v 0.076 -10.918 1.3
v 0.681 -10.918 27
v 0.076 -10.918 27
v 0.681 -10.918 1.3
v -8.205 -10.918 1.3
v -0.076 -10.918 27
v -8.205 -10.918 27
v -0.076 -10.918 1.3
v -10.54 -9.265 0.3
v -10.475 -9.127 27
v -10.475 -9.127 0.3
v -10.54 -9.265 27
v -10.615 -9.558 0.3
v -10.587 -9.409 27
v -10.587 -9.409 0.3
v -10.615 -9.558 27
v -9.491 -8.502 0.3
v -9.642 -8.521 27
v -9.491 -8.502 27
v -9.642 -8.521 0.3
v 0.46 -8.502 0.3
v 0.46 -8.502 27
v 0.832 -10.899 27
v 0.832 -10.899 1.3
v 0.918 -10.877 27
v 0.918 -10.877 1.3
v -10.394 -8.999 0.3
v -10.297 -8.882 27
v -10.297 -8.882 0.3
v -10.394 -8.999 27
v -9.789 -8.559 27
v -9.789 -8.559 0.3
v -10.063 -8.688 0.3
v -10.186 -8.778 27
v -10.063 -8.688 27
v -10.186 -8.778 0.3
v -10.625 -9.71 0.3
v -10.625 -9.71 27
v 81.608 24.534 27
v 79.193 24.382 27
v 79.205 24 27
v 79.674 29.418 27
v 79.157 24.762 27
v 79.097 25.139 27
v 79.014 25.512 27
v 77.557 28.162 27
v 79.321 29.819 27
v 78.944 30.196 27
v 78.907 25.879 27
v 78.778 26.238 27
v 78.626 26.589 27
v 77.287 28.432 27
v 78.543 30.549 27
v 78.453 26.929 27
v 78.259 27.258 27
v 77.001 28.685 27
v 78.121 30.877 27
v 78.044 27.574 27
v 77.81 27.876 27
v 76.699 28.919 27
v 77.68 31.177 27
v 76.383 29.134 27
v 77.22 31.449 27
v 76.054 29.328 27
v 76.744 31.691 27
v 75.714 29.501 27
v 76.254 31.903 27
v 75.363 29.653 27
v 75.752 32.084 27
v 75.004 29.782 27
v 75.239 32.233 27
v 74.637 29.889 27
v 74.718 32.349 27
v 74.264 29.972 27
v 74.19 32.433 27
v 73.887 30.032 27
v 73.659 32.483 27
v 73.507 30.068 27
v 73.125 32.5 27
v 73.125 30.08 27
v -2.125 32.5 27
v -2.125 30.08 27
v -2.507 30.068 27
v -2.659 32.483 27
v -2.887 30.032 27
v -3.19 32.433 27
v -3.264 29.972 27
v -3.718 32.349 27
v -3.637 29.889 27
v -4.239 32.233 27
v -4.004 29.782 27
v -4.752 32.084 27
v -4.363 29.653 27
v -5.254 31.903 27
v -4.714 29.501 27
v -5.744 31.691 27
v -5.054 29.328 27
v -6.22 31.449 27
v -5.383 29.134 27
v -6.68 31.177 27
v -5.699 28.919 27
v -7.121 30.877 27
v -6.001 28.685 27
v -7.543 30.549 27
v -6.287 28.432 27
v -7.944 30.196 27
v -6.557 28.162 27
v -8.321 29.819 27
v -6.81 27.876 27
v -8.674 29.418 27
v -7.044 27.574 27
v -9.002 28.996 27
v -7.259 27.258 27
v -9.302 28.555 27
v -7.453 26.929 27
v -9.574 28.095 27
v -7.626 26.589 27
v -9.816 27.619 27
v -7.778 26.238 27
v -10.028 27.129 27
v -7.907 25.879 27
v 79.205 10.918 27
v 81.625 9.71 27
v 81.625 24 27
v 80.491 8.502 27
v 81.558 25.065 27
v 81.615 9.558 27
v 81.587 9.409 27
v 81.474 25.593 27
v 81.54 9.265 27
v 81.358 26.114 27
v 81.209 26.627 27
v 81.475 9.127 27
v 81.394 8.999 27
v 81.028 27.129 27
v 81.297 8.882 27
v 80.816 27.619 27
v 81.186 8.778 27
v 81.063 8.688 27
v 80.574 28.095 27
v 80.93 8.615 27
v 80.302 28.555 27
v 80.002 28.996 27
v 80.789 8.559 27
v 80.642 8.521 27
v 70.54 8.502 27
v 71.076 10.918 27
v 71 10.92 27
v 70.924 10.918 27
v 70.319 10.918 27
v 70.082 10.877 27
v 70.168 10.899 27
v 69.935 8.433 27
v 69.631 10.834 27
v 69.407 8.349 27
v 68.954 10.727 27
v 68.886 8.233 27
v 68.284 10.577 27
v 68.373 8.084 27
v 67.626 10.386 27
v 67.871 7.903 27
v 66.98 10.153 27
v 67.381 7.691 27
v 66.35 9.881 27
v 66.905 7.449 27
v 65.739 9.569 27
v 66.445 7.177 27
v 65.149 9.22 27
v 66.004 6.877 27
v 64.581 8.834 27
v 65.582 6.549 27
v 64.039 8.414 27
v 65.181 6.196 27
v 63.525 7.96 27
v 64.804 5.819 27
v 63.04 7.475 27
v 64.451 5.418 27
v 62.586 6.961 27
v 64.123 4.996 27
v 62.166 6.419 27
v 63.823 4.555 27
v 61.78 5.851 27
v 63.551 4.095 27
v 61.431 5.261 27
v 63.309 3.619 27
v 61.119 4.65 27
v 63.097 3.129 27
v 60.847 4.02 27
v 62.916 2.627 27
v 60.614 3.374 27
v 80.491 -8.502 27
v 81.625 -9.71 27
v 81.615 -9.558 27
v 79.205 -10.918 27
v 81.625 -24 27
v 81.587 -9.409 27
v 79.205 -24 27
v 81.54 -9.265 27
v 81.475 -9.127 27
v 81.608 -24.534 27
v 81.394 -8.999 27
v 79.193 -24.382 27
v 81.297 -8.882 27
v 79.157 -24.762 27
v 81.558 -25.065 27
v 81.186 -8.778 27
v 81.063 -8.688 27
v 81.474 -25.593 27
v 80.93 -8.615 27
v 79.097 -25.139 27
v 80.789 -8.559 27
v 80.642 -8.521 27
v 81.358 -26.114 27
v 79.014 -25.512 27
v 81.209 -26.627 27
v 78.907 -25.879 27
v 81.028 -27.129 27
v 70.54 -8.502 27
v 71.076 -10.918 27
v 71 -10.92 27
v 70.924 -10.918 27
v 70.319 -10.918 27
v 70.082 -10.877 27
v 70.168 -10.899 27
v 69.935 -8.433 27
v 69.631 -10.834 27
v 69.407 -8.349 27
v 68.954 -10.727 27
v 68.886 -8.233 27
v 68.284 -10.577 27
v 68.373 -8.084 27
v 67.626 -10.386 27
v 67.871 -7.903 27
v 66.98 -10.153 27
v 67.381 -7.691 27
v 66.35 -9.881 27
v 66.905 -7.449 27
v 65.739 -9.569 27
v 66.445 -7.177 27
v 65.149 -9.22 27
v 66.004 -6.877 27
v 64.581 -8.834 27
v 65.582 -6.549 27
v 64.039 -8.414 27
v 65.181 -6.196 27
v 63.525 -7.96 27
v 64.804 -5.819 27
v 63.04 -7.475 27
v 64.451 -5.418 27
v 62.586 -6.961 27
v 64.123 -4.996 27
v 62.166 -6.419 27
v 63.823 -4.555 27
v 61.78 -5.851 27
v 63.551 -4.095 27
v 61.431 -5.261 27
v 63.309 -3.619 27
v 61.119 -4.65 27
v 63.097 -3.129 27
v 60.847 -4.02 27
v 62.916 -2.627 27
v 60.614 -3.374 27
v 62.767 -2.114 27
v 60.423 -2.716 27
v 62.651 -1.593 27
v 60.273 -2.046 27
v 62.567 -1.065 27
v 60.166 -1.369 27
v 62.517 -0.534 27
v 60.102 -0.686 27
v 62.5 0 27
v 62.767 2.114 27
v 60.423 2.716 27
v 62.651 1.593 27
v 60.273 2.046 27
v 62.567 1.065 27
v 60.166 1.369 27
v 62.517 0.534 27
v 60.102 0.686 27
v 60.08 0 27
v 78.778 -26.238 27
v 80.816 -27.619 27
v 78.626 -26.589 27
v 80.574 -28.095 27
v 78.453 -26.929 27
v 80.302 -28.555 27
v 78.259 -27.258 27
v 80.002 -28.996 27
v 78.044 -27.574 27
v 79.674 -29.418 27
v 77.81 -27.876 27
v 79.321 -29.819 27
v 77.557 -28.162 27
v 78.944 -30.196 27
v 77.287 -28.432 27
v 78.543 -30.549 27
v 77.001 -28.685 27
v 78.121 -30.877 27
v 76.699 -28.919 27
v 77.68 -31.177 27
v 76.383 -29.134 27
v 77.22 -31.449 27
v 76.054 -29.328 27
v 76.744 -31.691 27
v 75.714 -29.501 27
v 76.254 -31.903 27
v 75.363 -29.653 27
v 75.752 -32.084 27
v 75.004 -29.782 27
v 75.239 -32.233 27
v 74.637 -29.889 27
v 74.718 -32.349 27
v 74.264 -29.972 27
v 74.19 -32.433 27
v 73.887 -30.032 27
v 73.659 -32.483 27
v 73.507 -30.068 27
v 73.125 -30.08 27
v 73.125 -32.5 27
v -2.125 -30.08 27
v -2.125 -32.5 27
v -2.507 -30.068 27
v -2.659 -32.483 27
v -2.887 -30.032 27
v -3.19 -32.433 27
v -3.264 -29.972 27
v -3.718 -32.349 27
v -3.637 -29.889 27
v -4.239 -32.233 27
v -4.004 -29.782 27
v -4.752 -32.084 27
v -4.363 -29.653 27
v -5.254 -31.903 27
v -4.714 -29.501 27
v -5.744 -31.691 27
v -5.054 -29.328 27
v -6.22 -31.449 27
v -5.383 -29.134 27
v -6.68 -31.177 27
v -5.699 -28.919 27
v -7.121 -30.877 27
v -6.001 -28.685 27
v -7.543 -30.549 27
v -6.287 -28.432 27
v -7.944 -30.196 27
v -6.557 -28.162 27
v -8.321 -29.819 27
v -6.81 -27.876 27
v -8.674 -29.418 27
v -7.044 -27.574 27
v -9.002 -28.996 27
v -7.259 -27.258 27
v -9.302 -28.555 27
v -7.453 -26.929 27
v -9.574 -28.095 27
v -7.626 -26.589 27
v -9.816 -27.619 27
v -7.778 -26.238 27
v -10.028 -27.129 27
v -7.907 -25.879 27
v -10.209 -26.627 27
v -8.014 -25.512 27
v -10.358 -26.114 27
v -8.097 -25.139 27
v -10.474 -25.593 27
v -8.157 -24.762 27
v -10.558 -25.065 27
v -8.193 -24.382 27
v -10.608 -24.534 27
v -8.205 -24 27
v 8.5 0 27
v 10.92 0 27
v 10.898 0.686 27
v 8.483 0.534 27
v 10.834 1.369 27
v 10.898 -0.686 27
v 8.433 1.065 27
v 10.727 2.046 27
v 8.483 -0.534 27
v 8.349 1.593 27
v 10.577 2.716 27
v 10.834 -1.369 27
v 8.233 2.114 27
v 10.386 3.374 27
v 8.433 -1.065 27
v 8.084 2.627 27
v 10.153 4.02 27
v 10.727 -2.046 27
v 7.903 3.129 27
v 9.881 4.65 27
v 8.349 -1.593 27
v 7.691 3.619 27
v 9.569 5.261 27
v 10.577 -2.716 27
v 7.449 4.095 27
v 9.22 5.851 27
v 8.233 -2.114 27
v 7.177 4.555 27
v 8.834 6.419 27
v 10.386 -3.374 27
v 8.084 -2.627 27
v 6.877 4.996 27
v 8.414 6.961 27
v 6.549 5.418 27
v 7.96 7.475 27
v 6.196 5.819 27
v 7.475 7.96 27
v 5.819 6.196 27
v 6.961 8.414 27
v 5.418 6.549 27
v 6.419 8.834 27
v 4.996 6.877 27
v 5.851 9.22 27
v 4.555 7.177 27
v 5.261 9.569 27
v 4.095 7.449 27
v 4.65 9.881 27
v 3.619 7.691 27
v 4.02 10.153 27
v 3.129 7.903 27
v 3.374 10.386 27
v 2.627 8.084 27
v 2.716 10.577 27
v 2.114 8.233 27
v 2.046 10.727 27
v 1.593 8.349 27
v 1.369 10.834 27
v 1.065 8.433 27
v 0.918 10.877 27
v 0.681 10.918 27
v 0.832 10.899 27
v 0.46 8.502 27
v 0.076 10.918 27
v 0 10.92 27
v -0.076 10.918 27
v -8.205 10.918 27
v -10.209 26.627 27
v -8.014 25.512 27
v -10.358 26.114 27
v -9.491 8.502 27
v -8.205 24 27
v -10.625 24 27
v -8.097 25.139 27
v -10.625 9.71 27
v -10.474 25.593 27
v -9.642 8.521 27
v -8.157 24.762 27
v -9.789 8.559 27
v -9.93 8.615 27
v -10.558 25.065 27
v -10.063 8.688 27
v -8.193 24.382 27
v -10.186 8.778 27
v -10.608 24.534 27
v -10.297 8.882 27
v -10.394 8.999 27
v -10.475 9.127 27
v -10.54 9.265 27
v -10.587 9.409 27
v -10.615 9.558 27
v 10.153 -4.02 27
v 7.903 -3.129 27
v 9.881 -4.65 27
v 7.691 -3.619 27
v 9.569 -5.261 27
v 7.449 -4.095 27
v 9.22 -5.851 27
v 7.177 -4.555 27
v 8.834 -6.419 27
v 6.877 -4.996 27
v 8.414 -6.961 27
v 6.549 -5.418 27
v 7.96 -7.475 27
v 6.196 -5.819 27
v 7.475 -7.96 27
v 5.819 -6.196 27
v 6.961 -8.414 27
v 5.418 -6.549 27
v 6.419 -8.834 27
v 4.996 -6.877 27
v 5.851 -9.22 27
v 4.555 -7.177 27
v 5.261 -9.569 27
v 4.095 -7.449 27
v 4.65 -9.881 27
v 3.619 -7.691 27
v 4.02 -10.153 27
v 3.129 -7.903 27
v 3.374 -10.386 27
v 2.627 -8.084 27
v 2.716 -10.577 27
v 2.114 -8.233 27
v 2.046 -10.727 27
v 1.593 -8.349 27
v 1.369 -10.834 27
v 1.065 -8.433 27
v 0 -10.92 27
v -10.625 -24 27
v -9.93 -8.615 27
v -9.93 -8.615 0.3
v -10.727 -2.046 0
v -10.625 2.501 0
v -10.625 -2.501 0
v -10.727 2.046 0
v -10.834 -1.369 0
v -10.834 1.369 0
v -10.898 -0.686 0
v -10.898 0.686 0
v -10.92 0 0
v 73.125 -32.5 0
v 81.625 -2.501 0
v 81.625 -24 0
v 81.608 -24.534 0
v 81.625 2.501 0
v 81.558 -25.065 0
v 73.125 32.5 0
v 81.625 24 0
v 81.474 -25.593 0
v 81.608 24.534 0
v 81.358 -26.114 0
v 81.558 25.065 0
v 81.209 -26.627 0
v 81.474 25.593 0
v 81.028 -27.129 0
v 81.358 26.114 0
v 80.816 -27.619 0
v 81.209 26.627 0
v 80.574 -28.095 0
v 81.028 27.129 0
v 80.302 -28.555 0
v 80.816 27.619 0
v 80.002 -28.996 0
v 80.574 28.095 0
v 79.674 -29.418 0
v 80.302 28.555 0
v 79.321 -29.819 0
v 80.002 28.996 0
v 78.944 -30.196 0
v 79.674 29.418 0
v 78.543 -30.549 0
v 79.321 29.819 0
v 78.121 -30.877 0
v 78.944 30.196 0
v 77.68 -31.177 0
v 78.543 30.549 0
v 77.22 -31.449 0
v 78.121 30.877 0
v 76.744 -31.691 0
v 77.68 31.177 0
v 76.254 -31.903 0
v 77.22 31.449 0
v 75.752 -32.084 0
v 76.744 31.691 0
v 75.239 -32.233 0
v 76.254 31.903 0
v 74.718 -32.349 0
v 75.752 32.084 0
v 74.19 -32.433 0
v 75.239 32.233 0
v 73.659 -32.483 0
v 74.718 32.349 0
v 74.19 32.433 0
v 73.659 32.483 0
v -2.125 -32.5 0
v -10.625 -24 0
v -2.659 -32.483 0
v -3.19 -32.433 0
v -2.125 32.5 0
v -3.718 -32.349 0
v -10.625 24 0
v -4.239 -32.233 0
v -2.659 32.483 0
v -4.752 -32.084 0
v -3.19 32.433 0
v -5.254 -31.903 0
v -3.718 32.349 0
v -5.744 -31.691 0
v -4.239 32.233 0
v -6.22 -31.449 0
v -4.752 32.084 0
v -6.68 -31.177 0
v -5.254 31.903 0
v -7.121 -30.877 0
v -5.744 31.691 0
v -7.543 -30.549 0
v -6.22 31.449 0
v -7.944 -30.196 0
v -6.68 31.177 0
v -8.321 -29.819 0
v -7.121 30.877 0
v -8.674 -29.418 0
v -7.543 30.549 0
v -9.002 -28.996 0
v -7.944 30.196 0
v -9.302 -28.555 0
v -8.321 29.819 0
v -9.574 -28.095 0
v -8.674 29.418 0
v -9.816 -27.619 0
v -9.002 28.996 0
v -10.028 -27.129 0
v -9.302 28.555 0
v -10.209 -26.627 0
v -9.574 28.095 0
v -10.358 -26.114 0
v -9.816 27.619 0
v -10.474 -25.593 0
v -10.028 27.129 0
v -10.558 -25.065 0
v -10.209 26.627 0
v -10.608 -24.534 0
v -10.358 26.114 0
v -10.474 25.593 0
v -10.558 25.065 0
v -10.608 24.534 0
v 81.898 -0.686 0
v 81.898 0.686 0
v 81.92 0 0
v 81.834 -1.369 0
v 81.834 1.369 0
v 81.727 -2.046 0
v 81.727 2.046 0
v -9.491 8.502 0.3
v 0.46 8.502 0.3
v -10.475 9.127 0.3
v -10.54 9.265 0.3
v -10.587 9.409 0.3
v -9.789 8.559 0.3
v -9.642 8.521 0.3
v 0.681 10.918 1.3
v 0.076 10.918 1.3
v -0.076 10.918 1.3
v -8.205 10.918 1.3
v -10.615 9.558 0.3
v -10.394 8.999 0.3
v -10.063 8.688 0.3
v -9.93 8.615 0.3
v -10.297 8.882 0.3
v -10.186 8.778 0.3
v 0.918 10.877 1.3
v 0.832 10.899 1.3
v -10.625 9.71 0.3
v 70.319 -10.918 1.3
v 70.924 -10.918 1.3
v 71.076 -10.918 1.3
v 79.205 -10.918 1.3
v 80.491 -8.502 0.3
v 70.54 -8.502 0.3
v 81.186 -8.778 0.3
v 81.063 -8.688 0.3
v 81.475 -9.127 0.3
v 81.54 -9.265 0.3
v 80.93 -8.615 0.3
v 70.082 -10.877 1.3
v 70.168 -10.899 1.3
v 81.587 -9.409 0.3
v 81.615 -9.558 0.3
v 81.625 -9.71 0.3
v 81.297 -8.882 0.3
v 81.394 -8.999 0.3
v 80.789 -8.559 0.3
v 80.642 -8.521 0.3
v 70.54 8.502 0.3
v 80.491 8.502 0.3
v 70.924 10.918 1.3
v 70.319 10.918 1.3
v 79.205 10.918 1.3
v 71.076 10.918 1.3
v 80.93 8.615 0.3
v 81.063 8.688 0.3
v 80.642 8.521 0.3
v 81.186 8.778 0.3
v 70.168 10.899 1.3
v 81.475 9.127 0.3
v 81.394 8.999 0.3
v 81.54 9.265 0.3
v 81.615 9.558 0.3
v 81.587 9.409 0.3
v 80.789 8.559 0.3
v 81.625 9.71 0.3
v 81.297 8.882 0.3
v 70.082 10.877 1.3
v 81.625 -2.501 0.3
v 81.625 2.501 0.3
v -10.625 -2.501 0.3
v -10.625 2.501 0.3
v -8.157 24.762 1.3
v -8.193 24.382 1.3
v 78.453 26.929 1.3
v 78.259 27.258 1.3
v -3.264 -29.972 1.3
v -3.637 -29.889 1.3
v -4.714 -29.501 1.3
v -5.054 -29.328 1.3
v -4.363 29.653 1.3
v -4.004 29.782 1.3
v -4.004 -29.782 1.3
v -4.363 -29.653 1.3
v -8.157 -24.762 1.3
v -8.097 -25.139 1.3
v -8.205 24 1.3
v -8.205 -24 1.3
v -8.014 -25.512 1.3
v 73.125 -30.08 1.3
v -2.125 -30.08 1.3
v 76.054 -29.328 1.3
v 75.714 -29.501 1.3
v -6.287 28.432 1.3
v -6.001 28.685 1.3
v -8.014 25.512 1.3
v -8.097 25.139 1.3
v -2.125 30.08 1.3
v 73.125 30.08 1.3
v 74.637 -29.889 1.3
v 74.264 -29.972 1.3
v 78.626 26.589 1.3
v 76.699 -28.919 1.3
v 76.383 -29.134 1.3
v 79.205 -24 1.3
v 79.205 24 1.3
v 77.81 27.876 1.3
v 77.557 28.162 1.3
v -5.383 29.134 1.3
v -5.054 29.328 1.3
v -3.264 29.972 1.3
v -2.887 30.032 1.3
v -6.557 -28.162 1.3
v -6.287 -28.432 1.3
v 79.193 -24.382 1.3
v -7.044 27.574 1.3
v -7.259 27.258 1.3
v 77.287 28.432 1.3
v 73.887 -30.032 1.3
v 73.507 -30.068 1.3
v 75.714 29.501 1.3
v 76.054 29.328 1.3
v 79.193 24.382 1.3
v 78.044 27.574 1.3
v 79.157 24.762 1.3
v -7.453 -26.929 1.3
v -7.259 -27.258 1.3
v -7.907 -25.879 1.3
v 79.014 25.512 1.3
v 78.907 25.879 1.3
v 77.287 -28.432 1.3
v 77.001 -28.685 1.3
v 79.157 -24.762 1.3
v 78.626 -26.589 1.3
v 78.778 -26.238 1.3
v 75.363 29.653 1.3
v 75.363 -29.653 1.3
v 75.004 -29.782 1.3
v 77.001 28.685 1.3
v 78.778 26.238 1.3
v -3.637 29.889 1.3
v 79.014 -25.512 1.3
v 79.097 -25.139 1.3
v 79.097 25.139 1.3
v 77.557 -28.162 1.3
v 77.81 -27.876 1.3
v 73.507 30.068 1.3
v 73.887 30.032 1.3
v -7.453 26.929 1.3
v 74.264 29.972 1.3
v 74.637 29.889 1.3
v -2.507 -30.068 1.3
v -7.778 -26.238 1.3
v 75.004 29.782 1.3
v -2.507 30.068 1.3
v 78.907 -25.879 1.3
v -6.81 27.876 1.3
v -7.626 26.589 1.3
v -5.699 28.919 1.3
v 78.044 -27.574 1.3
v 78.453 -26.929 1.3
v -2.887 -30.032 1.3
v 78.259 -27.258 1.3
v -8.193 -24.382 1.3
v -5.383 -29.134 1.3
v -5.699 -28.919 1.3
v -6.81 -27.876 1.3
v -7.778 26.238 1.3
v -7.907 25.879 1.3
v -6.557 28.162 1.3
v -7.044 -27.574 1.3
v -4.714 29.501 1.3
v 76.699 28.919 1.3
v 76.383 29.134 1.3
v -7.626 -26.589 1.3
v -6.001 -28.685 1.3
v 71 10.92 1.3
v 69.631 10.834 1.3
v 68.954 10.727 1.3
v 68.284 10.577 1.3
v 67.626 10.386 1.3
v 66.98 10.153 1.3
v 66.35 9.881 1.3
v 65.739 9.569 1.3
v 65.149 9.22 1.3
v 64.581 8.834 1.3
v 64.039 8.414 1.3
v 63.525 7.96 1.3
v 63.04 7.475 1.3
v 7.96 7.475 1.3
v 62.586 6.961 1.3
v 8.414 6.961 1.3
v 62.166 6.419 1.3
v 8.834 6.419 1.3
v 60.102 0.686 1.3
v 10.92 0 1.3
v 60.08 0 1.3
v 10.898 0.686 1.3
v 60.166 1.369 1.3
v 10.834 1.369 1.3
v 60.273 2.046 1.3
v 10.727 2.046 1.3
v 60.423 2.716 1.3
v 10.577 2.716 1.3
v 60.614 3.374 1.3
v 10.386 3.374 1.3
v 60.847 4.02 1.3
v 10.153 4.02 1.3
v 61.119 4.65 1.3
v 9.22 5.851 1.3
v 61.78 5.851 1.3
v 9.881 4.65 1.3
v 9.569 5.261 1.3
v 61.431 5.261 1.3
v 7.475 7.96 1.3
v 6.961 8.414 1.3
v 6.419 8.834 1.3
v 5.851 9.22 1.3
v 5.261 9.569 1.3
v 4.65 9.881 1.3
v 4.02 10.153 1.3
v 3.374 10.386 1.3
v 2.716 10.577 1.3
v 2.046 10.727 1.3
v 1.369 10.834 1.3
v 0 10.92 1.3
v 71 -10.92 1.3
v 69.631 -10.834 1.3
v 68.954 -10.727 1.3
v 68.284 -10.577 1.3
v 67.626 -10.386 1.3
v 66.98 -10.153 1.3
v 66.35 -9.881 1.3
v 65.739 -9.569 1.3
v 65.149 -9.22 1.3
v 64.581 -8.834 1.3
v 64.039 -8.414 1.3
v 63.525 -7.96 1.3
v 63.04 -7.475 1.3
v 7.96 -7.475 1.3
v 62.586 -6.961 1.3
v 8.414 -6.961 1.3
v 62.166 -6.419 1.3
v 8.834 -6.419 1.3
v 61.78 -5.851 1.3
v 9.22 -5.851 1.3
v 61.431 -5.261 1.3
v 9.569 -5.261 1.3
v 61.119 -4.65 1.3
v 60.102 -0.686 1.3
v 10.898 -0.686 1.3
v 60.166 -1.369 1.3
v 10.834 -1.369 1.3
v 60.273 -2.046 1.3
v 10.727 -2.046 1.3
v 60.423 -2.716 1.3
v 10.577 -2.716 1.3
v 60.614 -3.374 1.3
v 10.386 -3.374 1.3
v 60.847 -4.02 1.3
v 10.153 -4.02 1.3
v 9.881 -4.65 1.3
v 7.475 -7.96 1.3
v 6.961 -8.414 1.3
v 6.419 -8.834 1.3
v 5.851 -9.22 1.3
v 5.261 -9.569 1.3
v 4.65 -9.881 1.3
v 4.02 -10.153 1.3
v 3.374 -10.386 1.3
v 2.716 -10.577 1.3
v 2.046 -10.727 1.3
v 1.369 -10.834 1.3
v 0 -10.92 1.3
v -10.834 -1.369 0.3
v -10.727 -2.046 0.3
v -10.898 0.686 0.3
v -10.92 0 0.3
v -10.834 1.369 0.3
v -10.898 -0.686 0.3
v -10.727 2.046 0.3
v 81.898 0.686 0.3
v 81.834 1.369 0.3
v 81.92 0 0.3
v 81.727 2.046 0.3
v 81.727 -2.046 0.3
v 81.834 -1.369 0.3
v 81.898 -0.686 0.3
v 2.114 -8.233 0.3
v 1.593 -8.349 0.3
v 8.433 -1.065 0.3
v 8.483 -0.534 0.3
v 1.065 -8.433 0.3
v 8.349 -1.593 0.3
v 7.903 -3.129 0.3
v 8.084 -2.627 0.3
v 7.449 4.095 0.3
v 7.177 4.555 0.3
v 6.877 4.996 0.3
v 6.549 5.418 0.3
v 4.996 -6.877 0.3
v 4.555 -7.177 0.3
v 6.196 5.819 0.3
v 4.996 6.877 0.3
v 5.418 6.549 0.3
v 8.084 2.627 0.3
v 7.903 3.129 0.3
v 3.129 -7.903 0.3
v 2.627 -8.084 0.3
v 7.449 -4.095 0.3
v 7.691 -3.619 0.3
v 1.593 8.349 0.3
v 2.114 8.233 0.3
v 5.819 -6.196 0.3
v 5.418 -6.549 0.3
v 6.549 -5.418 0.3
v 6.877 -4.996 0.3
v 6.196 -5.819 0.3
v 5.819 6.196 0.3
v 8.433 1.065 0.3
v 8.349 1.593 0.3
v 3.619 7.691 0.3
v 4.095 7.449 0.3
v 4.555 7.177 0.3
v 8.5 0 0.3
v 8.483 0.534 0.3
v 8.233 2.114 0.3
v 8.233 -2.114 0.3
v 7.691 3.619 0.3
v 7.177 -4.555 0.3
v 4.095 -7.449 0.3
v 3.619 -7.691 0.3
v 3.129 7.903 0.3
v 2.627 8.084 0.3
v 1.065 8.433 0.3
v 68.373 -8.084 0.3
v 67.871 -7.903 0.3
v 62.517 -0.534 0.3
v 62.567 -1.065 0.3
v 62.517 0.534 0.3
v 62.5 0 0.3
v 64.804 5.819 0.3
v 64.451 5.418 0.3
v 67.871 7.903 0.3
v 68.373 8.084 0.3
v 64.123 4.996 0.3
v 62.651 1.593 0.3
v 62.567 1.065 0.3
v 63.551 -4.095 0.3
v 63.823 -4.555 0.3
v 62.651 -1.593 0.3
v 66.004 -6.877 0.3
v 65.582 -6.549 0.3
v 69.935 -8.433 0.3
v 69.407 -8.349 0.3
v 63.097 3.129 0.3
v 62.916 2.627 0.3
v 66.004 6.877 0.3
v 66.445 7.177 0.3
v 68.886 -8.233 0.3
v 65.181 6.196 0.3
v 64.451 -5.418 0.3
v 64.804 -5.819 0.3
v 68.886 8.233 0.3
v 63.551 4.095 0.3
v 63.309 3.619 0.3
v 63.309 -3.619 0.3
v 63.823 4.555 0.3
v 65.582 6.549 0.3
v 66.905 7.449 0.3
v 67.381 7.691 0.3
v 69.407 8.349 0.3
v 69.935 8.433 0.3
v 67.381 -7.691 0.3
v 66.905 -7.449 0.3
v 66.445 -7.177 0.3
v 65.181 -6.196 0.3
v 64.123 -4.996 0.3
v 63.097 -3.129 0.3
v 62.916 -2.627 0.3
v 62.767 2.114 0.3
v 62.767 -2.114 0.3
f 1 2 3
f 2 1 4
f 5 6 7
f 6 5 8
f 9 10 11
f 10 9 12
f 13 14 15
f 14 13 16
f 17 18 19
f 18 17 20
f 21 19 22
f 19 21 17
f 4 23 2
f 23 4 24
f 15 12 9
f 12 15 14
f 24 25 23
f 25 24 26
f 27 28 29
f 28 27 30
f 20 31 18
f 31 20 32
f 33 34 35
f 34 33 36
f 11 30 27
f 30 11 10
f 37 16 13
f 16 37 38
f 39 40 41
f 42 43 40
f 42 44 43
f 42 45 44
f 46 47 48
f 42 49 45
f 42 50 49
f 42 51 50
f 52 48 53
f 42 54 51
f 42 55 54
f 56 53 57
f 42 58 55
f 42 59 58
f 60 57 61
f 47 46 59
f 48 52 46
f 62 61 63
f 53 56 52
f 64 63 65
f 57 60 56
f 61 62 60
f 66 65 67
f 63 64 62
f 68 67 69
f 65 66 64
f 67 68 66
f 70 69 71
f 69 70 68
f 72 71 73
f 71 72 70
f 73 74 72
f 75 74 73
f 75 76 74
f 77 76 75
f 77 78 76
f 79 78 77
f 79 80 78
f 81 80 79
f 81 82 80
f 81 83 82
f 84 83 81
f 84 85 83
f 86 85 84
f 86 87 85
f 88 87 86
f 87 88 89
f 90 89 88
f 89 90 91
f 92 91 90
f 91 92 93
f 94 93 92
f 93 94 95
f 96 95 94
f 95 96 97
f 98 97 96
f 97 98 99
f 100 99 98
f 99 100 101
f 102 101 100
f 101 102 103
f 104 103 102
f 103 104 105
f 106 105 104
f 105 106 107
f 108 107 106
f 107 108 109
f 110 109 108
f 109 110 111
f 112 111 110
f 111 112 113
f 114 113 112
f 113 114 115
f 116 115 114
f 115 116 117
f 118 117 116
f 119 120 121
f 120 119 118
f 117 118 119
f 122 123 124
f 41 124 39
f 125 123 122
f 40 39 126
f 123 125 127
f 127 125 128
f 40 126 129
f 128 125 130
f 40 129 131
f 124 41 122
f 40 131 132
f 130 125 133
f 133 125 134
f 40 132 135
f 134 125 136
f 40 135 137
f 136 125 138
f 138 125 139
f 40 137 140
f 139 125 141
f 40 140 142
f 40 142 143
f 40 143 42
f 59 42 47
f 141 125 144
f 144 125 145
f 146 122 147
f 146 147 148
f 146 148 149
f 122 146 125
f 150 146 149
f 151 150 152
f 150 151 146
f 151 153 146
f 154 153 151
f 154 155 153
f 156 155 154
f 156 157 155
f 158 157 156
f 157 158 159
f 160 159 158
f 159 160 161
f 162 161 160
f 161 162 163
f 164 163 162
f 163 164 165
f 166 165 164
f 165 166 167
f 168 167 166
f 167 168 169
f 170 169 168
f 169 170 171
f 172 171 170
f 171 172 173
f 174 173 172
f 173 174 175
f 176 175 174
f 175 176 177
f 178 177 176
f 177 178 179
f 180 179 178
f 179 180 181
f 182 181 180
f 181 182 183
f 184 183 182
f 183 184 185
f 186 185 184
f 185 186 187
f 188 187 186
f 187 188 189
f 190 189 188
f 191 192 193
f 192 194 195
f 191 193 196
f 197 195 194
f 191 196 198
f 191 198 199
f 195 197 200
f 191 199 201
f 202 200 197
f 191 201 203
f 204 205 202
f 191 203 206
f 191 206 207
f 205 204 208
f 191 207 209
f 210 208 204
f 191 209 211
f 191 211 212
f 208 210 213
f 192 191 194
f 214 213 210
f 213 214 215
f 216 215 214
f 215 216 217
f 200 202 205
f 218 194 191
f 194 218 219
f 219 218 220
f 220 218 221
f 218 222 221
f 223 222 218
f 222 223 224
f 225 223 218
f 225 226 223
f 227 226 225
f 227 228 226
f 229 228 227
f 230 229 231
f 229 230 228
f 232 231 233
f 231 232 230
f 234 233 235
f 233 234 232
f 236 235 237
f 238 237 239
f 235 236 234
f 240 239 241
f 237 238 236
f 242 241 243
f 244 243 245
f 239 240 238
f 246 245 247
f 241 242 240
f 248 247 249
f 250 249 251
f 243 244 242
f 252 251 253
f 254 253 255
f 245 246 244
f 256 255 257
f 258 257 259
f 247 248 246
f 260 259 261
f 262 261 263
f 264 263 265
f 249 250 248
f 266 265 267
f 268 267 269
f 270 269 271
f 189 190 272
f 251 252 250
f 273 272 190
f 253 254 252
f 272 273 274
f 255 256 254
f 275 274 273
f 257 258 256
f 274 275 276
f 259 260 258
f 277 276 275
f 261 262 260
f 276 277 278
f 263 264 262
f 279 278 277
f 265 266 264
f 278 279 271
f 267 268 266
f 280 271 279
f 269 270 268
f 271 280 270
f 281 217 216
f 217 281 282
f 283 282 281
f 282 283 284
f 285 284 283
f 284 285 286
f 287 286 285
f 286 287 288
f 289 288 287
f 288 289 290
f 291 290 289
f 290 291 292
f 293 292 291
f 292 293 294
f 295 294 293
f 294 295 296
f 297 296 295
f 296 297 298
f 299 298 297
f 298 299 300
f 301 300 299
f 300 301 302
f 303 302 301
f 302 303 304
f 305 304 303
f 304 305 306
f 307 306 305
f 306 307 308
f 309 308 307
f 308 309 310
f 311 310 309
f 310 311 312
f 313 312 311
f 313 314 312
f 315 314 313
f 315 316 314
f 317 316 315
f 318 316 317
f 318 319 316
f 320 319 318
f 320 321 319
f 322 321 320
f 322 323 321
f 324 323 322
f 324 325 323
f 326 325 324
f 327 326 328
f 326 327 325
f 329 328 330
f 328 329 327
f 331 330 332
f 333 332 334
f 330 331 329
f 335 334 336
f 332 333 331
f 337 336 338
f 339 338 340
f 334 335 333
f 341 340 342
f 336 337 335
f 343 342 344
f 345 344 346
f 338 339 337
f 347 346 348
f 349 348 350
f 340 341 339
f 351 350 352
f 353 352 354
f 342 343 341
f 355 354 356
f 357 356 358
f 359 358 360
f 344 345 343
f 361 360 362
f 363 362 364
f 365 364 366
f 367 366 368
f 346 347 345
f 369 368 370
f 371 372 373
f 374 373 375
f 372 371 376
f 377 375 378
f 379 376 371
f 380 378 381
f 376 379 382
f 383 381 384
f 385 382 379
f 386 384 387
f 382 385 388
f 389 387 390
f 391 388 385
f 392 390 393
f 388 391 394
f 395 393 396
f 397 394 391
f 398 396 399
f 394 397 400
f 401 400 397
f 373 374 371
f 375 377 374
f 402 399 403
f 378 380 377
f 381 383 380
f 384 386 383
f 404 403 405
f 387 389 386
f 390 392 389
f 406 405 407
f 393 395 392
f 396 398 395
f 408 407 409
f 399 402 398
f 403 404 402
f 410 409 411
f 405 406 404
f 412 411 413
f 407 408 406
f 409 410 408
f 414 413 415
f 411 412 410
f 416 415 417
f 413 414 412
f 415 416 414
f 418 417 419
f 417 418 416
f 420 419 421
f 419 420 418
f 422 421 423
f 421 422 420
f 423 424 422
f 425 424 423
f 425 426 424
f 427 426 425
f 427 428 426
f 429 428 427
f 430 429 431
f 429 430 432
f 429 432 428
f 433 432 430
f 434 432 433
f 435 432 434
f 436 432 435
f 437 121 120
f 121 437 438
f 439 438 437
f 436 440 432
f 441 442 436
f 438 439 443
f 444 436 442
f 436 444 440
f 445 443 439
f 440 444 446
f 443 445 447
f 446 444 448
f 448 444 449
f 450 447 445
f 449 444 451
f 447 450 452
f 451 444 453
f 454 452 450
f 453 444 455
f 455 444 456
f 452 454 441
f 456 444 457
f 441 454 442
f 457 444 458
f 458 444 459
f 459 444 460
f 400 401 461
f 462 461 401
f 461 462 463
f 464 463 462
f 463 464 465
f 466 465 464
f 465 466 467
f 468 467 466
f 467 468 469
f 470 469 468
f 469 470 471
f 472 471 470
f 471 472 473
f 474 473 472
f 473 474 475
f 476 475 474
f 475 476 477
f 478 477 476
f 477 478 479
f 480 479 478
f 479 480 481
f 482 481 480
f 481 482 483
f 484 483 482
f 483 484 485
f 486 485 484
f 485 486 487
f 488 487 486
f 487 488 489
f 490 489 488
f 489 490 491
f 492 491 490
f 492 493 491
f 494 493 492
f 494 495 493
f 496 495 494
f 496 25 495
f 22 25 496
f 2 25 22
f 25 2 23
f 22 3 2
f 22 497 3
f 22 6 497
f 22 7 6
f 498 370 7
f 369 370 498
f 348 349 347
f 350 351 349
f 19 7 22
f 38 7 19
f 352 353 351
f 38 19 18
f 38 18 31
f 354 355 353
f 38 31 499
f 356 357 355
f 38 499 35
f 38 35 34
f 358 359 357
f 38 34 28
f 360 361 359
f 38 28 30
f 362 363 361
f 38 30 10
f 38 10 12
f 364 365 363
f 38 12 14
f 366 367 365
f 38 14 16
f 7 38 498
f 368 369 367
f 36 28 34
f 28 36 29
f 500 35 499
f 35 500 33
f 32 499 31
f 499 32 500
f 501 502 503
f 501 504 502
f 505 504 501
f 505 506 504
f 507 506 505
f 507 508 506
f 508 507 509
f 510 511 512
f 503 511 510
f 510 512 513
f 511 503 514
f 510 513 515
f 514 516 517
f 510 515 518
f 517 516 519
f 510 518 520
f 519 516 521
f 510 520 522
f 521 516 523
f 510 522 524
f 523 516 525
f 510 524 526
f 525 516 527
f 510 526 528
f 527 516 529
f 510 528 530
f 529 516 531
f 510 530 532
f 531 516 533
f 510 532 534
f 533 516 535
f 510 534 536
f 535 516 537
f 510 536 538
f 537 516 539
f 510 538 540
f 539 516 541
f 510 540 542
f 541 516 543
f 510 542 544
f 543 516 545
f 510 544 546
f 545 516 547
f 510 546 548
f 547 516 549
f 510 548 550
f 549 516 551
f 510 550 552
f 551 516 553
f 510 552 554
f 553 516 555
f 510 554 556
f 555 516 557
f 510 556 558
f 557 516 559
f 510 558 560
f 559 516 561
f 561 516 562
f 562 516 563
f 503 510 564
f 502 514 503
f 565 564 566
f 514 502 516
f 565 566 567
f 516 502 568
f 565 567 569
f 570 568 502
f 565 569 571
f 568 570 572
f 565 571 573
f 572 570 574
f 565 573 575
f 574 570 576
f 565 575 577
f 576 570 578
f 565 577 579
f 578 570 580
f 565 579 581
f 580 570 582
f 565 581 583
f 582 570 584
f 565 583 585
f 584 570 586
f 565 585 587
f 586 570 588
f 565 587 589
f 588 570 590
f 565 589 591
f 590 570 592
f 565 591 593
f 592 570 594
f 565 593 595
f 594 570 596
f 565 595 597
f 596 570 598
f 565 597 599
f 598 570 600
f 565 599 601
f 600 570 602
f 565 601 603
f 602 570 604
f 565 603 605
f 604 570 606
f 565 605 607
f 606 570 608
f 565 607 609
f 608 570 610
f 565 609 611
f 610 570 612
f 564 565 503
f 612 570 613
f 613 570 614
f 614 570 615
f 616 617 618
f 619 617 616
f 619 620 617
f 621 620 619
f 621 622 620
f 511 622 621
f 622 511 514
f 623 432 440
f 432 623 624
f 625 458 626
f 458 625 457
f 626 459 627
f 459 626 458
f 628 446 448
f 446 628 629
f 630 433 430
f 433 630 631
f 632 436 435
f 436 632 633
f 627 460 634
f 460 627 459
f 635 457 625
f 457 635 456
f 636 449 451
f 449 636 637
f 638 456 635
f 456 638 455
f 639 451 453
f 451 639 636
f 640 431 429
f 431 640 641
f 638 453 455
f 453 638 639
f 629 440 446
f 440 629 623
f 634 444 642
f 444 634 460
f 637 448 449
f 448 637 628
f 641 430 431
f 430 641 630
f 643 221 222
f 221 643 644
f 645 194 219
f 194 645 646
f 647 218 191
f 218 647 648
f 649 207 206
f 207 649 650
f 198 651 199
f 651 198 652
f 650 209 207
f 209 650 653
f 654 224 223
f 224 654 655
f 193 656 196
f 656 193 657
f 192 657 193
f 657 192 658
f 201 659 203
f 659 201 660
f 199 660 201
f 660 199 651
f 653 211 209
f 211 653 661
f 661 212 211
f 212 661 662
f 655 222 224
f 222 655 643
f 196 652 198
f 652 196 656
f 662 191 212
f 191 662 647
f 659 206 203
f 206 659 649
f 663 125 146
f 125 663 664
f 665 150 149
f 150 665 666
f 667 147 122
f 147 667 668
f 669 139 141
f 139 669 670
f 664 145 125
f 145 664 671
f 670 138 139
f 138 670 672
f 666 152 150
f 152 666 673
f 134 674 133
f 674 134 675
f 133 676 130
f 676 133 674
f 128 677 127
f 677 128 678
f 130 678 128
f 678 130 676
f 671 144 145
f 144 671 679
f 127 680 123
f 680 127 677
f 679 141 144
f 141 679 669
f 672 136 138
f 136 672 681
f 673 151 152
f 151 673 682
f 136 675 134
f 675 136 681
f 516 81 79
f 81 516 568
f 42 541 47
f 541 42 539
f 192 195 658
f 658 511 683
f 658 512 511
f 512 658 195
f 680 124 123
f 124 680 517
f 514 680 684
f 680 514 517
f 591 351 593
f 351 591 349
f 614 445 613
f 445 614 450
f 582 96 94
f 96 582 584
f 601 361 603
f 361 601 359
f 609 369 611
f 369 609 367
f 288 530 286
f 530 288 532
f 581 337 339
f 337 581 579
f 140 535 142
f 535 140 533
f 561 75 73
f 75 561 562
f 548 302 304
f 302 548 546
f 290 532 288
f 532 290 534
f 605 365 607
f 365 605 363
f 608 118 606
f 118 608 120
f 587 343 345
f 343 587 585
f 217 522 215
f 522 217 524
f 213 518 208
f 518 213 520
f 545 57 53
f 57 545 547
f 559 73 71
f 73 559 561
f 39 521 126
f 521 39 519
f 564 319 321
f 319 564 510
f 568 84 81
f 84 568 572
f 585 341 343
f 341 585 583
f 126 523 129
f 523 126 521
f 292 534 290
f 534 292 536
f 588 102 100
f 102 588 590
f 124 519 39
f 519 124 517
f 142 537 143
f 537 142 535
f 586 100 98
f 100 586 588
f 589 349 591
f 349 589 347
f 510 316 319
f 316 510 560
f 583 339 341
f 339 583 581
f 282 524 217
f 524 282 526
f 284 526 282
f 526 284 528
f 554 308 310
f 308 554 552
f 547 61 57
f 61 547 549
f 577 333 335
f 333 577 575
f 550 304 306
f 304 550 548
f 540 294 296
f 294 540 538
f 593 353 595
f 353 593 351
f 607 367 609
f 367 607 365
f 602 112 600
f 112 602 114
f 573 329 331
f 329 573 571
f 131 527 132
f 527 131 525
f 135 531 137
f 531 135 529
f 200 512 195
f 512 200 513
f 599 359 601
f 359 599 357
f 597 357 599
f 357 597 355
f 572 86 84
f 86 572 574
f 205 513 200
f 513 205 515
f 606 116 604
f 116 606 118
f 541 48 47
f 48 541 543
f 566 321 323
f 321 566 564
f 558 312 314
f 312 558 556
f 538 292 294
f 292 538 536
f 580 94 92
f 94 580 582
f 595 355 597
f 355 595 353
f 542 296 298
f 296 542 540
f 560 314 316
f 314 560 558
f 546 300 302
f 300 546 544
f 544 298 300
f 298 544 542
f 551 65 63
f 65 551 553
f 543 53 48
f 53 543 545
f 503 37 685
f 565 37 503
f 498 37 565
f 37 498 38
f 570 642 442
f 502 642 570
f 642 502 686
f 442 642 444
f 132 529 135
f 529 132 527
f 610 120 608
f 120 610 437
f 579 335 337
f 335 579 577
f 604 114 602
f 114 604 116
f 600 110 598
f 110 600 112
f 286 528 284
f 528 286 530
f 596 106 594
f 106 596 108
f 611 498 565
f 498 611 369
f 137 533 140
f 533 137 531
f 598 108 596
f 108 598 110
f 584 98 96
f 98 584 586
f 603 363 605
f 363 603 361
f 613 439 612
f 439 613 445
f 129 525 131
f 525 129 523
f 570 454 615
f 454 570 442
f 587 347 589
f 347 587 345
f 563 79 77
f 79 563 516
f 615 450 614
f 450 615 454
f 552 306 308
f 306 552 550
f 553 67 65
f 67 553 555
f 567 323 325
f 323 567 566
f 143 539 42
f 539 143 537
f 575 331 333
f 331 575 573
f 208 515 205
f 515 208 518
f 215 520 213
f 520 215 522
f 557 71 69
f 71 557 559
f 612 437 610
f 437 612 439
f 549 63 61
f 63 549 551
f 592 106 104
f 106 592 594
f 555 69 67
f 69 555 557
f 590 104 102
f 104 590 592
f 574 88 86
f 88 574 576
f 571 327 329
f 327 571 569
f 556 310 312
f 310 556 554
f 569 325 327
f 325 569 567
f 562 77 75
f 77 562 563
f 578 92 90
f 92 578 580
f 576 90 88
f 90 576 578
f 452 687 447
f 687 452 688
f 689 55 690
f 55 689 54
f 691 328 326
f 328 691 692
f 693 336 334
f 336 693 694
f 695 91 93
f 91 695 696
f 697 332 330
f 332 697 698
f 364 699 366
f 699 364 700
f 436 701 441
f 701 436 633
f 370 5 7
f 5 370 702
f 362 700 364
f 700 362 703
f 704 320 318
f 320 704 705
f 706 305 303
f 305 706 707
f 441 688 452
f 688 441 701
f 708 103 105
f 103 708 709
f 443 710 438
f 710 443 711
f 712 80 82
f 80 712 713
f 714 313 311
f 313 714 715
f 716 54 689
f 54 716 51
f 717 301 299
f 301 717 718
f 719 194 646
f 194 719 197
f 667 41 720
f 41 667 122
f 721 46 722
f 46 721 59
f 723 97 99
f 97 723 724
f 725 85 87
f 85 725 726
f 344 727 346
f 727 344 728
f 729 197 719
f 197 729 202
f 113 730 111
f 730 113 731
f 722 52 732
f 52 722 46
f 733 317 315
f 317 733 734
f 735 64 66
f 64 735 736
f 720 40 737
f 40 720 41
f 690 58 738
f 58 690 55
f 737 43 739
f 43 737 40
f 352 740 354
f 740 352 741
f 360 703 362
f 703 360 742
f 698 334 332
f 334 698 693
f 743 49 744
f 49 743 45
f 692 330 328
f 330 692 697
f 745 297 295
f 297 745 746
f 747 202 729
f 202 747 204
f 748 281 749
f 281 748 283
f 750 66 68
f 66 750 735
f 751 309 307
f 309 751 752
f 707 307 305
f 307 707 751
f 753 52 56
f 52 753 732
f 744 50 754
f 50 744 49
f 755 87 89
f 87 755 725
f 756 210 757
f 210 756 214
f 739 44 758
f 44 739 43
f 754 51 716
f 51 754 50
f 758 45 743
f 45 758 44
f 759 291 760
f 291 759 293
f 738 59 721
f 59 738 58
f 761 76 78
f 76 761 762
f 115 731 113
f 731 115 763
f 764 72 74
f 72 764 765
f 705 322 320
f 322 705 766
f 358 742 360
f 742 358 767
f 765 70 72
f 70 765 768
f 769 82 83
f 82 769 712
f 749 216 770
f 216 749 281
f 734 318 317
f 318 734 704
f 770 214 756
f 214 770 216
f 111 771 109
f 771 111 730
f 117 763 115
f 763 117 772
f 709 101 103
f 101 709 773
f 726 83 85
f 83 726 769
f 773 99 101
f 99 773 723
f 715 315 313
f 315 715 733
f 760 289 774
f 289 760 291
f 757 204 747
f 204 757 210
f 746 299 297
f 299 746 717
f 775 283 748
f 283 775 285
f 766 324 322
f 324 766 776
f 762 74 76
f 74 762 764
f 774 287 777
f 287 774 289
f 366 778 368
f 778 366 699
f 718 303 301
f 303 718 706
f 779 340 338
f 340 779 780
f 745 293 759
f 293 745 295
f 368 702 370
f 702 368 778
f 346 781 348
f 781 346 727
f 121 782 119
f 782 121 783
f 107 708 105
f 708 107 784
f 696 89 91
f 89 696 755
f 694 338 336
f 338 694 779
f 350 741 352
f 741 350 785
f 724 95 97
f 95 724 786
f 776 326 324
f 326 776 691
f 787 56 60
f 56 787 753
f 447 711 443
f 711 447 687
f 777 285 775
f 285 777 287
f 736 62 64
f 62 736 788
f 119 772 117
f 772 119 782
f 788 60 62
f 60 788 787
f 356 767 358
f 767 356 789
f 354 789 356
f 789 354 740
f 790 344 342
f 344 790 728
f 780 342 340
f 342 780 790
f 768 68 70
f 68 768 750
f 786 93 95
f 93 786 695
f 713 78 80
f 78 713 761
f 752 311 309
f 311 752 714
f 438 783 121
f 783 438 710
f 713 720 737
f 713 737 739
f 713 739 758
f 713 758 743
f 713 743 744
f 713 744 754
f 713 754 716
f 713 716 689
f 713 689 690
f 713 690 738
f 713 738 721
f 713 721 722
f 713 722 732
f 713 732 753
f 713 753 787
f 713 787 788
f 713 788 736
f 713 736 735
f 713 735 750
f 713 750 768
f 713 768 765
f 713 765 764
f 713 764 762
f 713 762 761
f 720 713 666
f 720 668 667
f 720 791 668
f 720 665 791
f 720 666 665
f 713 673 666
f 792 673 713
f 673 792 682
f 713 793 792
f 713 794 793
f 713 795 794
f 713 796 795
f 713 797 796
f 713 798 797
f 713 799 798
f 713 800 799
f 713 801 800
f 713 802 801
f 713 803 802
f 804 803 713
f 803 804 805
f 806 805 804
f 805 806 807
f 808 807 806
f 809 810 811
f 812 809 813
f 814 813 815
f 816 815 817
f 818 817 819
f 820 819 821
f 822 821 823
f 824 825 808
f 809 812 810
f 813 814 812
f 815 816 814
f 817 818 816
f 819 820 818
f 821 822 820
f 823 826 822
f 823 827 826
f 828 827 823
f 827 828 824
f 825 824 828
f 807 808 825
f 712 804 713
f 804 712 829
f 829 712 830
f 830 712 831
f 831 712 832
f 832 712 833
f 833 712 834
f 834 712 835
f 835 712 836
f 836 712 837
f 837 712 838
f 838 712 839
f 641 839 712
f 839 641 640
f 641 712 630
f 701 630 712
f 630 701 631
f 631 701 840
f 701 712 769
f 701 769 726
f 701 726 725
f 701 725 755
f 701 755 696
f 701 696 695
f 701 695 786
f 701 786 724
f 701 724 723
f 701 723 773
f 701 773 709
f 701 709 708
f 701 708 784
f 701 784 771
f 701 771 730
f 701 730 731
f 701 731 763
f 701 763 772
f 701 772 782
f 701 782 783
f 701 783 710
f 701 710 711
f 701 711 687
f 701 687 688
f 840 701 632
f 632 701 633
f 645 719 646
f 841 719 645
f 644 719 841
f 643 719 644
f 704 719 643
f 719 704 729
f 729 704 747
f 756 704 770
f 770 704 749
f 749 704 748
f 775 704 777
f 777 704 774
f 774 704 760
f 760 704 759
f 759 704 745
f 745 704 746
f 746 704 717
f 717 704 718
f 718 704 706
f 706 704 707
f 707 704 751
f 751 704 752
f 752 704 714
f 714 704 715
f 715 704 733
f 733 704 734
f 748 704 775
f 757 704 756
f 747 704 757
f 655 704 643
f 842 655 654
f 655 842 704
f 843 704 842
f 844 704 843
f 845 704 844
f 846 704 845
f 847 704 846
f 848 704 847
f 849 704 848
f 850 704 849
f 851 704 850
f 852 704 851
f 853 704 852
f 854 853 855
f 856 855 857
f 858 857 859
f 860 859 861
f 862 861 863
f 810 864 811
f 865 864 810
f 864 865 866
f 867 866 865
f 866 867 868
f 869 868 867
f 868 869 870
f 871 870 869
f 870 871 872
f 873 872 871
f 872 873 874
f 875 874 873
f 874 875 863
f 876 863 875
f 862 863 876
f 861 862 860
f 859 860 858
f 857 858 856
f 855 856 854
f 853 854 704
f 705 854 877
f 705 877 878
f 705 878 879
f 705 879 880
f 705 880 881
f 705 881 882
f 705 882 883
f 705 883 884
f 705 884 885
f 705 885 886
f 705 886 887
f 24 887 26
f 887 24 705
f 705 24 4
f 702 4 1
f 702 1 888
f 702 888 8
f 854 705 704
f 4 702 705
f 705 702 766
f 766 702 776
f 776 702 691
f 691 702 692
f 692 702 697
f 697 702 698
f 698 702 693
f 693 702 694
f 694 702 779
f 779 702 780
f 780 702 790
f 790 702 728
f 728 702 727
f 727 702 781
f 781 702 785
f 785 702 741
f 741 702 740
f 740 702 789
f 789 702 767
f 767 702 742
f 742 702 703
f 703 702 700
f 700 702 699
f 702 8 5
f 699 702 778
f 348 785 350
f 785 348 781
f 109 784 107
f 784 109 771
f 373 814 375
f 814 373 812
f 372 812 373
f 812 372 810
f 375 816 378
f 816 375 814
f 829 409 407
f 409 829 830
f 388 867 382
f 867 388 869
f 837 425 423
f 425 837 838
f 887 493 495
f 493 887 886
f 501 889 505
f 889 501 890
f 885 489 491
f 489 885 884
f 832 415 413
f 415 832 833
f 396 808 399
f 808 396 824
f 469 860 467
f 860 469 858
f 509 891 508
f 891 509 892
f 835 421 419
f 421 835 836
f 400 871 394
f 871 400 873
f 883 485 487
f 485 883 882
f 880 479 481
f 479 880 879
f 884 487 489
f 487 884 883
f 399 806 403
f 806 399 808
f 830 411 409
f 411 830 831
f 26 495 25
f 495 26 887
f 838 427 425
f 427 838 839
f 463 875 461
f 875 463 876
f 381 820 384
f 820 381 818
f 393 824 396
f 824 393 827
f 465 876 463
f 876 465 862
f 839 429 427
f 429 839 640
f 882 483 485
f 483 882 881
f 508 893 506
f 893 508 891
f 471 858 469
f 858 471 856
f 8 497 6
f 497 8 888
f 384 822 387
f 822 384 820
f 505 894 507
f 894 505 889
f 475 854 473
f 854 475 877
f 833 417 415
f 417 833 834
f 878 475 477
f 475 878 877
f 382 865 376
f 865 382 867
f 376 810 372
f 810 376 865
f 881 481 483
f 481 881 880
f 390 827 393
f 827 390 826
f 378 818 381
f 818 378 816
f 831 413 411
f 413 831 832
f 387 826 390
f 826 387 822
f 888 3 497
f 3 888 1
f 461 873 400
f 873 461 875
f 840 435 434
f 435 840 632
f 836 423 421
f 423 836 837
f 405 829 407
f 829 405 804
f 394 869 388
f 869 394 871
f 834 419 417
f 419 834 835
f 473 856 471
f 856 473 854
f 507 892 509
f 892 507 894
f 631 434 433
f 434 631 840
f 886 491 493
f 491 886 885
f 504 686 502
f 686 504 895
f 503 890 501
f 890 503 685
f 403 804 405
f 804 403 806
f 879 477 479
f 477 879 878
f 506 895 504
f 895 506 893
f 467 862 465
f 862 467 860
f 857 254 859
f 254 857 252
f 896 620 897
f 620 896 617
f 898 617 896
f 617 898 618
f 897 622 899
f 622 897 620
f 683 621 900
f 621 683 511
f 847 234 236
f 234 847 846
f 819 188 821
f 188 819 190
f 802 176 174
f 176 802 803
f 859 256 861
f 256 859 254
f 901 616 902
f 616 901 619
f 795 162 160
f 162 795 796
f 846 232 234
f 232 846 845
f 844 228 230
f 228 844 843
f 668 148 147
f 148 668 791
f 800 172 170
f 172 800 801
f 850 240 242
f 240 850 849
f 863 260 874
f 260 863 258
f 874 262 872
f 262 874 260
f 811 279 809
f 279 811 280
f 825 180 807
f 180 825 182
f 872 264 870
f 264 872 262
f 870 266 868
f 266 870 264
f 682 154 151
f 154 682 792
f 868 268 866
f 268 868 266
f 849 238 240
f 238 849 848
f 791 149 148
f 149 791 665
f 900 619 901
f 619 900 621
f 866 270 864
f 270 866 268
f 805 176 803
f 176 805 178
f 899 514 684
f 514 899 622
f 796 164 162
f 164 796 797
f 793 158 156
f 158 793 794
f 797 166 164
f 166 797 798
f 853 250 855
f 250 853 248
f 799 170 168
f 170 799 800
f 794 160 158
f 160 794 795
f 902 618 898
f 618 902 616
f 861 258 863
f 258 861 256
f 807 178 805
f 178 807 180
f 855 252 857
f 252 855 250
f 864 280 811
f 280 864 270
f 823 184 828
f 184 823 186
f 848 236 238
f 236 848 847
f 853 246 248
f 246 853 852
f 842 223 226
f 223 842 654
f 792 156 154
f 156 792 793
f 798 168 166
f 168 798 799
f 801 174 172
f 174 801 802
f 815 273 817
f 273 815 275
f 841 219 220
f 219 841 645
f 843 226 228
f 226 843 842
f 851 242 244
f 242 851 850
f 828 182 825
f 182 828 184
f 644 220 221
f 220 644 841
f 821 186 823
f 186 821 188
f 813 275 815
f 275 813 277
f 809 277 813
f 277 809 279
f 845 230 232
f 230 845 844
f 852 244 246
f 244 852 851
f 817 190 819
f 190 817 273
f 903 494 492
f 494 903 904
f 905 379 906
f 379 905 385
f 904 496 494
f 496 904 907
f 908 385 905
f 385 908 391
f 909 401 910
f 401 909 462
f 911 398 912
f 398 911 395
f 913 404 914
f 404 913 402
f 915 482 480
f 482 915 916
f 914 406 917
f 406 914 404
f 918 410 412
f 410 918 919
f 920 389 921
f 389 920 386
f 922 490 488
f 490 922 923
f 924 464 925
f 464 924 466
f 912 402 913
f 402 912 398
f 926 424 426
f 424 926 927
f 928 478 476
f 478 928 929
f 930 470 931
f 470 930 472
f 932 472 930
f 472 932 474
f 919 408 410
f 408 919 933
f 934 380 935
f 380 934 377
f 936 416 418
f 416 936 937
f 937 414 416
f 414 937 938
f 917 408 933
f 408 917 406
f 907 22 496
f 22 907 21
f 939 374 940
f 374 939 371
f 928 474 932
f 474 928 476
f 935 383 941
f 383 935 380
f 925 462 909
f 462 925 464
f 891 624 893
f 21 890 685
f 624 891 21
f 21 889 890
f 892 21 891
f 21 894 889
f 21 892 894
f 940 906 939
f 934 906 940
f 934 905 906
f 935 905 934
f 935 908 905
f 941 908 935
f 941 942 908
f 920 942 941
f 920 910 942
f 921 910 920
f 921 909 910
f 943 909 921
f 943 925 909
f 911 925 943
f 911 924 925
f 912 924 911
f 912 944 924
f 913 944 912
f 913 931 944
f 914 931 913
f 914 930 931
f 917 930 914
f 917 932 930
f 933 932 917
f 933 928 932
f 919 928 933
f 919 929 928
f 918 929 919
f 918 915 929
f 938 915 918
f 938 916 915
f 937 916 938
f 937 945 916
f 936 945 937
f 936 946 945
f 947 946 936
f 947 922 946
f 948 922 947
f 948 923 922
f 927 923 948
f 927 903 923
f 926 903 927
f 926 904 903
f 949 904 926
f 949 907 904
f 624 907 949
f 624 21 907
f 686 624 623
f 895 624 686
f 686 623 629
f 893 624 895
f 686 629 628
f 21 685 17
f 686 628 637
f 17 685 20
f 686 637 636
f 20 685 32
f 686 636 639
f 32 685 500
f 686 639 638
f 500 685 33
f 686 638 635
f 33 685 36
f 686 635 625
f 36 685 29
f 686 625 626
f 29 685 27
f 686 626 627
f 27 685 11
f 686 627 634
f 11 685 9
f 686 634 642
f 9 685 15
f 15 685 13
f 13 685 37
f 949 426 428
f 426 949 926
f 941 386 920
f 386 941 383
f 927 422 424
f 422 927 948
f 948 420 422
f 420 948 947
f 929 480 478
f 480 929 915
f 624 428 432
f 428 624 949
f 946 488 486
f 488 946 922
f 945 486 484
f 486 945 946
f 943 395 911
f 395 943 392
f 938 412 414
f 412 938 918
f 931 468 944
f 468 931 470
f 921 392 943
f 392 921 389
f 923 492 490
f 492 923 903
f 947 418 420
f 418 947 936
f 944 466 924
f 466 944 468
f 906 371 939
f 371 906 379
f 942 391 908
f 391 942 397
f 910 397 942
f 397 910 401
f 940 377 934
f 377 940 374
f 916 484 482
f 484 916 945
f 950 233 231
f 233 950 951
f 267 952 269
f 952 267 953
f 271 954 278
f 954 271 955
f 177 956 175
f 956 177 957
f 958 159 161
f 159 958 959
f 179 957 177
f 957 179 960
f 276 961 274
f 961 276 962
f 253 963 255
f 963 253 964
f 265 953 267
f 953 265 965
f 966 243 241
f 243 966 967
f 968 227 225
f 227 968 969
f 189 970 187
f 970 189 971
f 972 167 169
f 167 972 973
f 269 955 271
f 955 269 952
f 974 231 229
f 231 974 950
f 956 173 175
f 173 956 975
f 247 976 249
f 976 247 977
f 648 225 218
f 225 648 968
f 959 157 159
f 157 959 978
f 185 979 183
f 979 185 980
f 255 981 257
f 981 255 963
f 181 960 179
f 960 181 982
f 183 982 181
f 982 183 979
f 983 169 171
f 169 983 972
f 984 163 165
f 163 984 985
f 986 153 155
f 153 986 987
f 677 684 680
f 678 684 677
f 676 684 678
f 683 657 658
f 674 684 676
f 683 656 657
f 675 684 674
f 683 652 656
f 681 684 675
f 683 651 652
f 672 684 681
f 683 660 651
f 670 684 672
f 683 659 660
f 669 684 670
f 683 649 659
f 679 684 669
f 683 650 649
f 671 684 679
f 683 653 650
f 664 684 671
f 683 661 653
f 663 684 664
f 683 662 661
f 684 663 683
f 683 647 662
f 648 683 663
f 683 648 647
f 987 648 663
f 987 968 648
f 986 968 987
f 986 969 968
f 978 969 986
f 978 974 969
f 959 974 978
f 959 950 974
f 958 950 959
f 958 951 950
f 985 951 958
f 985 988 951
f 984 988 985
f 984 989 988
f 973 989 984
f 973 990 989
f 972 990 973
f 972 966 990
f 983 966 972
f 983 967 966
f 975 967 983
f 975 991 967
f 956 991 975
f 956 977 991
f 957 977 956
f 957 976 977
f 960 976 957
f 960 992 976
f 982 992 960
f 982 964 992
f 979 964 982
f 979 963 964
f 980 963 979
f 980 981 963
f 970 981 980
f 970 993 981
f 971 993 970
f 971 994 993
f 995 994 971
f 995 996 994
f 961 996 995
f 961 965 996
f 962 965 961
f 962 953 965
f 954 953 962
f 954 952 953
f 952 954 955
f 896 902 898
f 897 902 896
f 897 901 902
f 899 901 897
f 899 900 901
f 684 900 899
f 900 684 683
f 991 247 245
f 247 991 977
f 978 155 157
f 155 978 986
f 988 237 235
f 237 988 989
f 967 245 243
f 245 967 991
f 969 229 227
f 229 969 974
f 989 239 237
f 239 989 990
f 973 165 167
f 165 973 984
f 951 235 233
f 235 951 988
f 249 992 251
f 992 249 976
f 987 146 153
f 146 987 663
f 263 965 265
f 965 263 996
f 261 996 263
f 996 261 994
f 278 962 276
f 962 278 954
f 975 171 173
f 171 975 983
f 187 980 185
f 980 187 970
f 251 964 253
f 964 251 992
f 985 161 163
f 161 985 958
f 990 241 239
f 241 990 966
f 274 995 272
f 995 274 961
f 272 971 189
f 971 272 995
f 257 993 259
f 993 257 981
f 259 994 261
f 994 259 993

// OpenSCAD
// Written by Remi Vansnickt <>
//Feel free to tip me : https://www.thingiverse.com/Remivans/about
//Thingiverse : https://www.thingiverse.com/thing:3273050
//Licensed under the Creative Commons - Attribution - Non-Commercial - Share Alike license.

/* [Children bed parameter] */

//(mm)bar diameter
barDiameter=17;//[5:0.1:50]

//(mm) space beetween inner bar
barSpace=54;//[10:0.1:200]

//(mm) Height of output part ( barSpace/2 for uniforme top )
partHeight=27;//[5:0.5:200]

//(mm) Width of output part
partWidth=65;//[5:0.5:200]

//(mm) Height of bottom
floorHeight=1.3;//[0.3:0.1:5]

//(mm) Do you need space beetween part and bar
clearance=0;//[-2:0.1:2]

/* [Printer setting] */
//(mm) Height of first layer ( for removable brim inside hole)
PrinterFirstLayerHeight=0.3;//[0.1:0.01:0.5]

//(mm) Width of your Printer nozzle
PrinterNozzleWidth=0.4;//[0.1:0.05:1]

// number of wall
PartNumberWall=6;//[3:1:20]

cylinderPath=barSpace+barDiameter;
rPath=PrinterNozzleWidth*PartNumberWall/2+0.01;

//output
helper();
output();


//module
module barreau(clearance=0,cut=0){
	translate([0,0,-cut])cylinder(r=barDiameter/2+clearance,h=barSpace/2+2*cut,$fn=100);
	}

module helper(){
	$fn=50;
	hull(){
		translate([-barDiameter/8-barDiameter/2+rPath,-barDiameter/2-rPath-clearance,0])cylinder(r=rPath,h=partHeight);
		translate([+rPath/2,-barDiameter/2-rPath-+clearance,0])cylinder(r=rPath,h=partHeight);
		}
	hull(){
		translate([-barDiameter/8-barDiameter/2+rPath,+barDiameter/2+rPath+clearance,0])cylinder(r=rPath,h=partHeight);
		translate([+rPath/2,+barDiameter/2+rPath+clearance,0])cylinder(r=rPath,h=partHeight);
		}
		
			hull(){
		translate([cylinderPath+barDiameter/8+barDiameter/2-rPath,-barDiameter/2-rPath-+clearance,0])cylinder(r=rPath,h=partHeight);
		translate([-rPath/2+cylinderPath,-barDiameter/2-rPath-+clearance,0])cylinder(r=rPath,h=partHeight);
		}
	hull(){
		translate([cylinderPath+barDiameter/8+barDiameter/2-rPath,+barDiameter/2+rPath+clearance,0])cylinder(r=rPath,h=partHeight);
		translate([-rPath/2+cylinderPath,+barDiameter/2+rPath+clearance,0])cylinder(r=rPath,h=partHeight);
		}
	}

module output(){
	difference(){
		union(){
			//barreau
				translate([0,0,0])barreau(2*rPath+clearance,0);
				translate([cylinderPath,0,0])barreau(2*rPath+clearance,0);
		difference(){

				//cup
			scale([1,1,2*partHeight/barSpace])
			hull(){
				translate([-barDiameter/8,partWidth/2-barDiameter/2,0])barreau(0,0);
				translate([-barDiameter/8,-partWidth/2+barDiameter/2,0])barreau(0,0);
				
				translate([cylinderPath+barDiameter/8,partWidth/2-barDiameter/2,0])barreau(0,0);
				translate([cylinderPath+barDiameter/8,-partWidth/2+barDiameter/2,0])barreau(0,0);
				}	
			
			hull(){
				translate([-barDiameter/8,partWidth/2-barDiameter/2,floorHeight])scale([1,1,2*partHeight/barSpace])barreau(-2*rPath,0);
				translate([-barDiameter/8,-partWidth/2+barDiameter/2,floorHeight])scale([1,1,2*partHeight/barSpace])barreau(-2*rPath,0);
				
				translate([cylinderPath+barDiameter/8,partWidth/2-barDiameter/2,floorHeight])scale([1,1,2*partHeight/barSpace])barreau(-2*rPath,0);
				translate([cylinderPath+barDiameter/8,-partWidth/2+barDiameter/2,floorHeight])scale([1,1,2*partHeight/barSpace])barreau(-2*rPath,0);
				}
			
		}	
		}
		union(){
			//cut barreau
			scale([1,1,2*partHeight/barSpace])
			hull(){
				translate([0,0,0.3])barreau(clearance,0);
				translate([-barDiameter/8-barDiameter/2,0,0.3])barreau(rPath,0);
				}
			scale([1,1,2*partHeight/barSpace])
			hull(){
				translate([cylinderPath+barDiameter/2+barDiameter/8,0,0.3])barreau(rPath,0);
				translate([+cylinderPath,0,0.3])barreau(clearance,0);
				}
		}
	}
		
}
